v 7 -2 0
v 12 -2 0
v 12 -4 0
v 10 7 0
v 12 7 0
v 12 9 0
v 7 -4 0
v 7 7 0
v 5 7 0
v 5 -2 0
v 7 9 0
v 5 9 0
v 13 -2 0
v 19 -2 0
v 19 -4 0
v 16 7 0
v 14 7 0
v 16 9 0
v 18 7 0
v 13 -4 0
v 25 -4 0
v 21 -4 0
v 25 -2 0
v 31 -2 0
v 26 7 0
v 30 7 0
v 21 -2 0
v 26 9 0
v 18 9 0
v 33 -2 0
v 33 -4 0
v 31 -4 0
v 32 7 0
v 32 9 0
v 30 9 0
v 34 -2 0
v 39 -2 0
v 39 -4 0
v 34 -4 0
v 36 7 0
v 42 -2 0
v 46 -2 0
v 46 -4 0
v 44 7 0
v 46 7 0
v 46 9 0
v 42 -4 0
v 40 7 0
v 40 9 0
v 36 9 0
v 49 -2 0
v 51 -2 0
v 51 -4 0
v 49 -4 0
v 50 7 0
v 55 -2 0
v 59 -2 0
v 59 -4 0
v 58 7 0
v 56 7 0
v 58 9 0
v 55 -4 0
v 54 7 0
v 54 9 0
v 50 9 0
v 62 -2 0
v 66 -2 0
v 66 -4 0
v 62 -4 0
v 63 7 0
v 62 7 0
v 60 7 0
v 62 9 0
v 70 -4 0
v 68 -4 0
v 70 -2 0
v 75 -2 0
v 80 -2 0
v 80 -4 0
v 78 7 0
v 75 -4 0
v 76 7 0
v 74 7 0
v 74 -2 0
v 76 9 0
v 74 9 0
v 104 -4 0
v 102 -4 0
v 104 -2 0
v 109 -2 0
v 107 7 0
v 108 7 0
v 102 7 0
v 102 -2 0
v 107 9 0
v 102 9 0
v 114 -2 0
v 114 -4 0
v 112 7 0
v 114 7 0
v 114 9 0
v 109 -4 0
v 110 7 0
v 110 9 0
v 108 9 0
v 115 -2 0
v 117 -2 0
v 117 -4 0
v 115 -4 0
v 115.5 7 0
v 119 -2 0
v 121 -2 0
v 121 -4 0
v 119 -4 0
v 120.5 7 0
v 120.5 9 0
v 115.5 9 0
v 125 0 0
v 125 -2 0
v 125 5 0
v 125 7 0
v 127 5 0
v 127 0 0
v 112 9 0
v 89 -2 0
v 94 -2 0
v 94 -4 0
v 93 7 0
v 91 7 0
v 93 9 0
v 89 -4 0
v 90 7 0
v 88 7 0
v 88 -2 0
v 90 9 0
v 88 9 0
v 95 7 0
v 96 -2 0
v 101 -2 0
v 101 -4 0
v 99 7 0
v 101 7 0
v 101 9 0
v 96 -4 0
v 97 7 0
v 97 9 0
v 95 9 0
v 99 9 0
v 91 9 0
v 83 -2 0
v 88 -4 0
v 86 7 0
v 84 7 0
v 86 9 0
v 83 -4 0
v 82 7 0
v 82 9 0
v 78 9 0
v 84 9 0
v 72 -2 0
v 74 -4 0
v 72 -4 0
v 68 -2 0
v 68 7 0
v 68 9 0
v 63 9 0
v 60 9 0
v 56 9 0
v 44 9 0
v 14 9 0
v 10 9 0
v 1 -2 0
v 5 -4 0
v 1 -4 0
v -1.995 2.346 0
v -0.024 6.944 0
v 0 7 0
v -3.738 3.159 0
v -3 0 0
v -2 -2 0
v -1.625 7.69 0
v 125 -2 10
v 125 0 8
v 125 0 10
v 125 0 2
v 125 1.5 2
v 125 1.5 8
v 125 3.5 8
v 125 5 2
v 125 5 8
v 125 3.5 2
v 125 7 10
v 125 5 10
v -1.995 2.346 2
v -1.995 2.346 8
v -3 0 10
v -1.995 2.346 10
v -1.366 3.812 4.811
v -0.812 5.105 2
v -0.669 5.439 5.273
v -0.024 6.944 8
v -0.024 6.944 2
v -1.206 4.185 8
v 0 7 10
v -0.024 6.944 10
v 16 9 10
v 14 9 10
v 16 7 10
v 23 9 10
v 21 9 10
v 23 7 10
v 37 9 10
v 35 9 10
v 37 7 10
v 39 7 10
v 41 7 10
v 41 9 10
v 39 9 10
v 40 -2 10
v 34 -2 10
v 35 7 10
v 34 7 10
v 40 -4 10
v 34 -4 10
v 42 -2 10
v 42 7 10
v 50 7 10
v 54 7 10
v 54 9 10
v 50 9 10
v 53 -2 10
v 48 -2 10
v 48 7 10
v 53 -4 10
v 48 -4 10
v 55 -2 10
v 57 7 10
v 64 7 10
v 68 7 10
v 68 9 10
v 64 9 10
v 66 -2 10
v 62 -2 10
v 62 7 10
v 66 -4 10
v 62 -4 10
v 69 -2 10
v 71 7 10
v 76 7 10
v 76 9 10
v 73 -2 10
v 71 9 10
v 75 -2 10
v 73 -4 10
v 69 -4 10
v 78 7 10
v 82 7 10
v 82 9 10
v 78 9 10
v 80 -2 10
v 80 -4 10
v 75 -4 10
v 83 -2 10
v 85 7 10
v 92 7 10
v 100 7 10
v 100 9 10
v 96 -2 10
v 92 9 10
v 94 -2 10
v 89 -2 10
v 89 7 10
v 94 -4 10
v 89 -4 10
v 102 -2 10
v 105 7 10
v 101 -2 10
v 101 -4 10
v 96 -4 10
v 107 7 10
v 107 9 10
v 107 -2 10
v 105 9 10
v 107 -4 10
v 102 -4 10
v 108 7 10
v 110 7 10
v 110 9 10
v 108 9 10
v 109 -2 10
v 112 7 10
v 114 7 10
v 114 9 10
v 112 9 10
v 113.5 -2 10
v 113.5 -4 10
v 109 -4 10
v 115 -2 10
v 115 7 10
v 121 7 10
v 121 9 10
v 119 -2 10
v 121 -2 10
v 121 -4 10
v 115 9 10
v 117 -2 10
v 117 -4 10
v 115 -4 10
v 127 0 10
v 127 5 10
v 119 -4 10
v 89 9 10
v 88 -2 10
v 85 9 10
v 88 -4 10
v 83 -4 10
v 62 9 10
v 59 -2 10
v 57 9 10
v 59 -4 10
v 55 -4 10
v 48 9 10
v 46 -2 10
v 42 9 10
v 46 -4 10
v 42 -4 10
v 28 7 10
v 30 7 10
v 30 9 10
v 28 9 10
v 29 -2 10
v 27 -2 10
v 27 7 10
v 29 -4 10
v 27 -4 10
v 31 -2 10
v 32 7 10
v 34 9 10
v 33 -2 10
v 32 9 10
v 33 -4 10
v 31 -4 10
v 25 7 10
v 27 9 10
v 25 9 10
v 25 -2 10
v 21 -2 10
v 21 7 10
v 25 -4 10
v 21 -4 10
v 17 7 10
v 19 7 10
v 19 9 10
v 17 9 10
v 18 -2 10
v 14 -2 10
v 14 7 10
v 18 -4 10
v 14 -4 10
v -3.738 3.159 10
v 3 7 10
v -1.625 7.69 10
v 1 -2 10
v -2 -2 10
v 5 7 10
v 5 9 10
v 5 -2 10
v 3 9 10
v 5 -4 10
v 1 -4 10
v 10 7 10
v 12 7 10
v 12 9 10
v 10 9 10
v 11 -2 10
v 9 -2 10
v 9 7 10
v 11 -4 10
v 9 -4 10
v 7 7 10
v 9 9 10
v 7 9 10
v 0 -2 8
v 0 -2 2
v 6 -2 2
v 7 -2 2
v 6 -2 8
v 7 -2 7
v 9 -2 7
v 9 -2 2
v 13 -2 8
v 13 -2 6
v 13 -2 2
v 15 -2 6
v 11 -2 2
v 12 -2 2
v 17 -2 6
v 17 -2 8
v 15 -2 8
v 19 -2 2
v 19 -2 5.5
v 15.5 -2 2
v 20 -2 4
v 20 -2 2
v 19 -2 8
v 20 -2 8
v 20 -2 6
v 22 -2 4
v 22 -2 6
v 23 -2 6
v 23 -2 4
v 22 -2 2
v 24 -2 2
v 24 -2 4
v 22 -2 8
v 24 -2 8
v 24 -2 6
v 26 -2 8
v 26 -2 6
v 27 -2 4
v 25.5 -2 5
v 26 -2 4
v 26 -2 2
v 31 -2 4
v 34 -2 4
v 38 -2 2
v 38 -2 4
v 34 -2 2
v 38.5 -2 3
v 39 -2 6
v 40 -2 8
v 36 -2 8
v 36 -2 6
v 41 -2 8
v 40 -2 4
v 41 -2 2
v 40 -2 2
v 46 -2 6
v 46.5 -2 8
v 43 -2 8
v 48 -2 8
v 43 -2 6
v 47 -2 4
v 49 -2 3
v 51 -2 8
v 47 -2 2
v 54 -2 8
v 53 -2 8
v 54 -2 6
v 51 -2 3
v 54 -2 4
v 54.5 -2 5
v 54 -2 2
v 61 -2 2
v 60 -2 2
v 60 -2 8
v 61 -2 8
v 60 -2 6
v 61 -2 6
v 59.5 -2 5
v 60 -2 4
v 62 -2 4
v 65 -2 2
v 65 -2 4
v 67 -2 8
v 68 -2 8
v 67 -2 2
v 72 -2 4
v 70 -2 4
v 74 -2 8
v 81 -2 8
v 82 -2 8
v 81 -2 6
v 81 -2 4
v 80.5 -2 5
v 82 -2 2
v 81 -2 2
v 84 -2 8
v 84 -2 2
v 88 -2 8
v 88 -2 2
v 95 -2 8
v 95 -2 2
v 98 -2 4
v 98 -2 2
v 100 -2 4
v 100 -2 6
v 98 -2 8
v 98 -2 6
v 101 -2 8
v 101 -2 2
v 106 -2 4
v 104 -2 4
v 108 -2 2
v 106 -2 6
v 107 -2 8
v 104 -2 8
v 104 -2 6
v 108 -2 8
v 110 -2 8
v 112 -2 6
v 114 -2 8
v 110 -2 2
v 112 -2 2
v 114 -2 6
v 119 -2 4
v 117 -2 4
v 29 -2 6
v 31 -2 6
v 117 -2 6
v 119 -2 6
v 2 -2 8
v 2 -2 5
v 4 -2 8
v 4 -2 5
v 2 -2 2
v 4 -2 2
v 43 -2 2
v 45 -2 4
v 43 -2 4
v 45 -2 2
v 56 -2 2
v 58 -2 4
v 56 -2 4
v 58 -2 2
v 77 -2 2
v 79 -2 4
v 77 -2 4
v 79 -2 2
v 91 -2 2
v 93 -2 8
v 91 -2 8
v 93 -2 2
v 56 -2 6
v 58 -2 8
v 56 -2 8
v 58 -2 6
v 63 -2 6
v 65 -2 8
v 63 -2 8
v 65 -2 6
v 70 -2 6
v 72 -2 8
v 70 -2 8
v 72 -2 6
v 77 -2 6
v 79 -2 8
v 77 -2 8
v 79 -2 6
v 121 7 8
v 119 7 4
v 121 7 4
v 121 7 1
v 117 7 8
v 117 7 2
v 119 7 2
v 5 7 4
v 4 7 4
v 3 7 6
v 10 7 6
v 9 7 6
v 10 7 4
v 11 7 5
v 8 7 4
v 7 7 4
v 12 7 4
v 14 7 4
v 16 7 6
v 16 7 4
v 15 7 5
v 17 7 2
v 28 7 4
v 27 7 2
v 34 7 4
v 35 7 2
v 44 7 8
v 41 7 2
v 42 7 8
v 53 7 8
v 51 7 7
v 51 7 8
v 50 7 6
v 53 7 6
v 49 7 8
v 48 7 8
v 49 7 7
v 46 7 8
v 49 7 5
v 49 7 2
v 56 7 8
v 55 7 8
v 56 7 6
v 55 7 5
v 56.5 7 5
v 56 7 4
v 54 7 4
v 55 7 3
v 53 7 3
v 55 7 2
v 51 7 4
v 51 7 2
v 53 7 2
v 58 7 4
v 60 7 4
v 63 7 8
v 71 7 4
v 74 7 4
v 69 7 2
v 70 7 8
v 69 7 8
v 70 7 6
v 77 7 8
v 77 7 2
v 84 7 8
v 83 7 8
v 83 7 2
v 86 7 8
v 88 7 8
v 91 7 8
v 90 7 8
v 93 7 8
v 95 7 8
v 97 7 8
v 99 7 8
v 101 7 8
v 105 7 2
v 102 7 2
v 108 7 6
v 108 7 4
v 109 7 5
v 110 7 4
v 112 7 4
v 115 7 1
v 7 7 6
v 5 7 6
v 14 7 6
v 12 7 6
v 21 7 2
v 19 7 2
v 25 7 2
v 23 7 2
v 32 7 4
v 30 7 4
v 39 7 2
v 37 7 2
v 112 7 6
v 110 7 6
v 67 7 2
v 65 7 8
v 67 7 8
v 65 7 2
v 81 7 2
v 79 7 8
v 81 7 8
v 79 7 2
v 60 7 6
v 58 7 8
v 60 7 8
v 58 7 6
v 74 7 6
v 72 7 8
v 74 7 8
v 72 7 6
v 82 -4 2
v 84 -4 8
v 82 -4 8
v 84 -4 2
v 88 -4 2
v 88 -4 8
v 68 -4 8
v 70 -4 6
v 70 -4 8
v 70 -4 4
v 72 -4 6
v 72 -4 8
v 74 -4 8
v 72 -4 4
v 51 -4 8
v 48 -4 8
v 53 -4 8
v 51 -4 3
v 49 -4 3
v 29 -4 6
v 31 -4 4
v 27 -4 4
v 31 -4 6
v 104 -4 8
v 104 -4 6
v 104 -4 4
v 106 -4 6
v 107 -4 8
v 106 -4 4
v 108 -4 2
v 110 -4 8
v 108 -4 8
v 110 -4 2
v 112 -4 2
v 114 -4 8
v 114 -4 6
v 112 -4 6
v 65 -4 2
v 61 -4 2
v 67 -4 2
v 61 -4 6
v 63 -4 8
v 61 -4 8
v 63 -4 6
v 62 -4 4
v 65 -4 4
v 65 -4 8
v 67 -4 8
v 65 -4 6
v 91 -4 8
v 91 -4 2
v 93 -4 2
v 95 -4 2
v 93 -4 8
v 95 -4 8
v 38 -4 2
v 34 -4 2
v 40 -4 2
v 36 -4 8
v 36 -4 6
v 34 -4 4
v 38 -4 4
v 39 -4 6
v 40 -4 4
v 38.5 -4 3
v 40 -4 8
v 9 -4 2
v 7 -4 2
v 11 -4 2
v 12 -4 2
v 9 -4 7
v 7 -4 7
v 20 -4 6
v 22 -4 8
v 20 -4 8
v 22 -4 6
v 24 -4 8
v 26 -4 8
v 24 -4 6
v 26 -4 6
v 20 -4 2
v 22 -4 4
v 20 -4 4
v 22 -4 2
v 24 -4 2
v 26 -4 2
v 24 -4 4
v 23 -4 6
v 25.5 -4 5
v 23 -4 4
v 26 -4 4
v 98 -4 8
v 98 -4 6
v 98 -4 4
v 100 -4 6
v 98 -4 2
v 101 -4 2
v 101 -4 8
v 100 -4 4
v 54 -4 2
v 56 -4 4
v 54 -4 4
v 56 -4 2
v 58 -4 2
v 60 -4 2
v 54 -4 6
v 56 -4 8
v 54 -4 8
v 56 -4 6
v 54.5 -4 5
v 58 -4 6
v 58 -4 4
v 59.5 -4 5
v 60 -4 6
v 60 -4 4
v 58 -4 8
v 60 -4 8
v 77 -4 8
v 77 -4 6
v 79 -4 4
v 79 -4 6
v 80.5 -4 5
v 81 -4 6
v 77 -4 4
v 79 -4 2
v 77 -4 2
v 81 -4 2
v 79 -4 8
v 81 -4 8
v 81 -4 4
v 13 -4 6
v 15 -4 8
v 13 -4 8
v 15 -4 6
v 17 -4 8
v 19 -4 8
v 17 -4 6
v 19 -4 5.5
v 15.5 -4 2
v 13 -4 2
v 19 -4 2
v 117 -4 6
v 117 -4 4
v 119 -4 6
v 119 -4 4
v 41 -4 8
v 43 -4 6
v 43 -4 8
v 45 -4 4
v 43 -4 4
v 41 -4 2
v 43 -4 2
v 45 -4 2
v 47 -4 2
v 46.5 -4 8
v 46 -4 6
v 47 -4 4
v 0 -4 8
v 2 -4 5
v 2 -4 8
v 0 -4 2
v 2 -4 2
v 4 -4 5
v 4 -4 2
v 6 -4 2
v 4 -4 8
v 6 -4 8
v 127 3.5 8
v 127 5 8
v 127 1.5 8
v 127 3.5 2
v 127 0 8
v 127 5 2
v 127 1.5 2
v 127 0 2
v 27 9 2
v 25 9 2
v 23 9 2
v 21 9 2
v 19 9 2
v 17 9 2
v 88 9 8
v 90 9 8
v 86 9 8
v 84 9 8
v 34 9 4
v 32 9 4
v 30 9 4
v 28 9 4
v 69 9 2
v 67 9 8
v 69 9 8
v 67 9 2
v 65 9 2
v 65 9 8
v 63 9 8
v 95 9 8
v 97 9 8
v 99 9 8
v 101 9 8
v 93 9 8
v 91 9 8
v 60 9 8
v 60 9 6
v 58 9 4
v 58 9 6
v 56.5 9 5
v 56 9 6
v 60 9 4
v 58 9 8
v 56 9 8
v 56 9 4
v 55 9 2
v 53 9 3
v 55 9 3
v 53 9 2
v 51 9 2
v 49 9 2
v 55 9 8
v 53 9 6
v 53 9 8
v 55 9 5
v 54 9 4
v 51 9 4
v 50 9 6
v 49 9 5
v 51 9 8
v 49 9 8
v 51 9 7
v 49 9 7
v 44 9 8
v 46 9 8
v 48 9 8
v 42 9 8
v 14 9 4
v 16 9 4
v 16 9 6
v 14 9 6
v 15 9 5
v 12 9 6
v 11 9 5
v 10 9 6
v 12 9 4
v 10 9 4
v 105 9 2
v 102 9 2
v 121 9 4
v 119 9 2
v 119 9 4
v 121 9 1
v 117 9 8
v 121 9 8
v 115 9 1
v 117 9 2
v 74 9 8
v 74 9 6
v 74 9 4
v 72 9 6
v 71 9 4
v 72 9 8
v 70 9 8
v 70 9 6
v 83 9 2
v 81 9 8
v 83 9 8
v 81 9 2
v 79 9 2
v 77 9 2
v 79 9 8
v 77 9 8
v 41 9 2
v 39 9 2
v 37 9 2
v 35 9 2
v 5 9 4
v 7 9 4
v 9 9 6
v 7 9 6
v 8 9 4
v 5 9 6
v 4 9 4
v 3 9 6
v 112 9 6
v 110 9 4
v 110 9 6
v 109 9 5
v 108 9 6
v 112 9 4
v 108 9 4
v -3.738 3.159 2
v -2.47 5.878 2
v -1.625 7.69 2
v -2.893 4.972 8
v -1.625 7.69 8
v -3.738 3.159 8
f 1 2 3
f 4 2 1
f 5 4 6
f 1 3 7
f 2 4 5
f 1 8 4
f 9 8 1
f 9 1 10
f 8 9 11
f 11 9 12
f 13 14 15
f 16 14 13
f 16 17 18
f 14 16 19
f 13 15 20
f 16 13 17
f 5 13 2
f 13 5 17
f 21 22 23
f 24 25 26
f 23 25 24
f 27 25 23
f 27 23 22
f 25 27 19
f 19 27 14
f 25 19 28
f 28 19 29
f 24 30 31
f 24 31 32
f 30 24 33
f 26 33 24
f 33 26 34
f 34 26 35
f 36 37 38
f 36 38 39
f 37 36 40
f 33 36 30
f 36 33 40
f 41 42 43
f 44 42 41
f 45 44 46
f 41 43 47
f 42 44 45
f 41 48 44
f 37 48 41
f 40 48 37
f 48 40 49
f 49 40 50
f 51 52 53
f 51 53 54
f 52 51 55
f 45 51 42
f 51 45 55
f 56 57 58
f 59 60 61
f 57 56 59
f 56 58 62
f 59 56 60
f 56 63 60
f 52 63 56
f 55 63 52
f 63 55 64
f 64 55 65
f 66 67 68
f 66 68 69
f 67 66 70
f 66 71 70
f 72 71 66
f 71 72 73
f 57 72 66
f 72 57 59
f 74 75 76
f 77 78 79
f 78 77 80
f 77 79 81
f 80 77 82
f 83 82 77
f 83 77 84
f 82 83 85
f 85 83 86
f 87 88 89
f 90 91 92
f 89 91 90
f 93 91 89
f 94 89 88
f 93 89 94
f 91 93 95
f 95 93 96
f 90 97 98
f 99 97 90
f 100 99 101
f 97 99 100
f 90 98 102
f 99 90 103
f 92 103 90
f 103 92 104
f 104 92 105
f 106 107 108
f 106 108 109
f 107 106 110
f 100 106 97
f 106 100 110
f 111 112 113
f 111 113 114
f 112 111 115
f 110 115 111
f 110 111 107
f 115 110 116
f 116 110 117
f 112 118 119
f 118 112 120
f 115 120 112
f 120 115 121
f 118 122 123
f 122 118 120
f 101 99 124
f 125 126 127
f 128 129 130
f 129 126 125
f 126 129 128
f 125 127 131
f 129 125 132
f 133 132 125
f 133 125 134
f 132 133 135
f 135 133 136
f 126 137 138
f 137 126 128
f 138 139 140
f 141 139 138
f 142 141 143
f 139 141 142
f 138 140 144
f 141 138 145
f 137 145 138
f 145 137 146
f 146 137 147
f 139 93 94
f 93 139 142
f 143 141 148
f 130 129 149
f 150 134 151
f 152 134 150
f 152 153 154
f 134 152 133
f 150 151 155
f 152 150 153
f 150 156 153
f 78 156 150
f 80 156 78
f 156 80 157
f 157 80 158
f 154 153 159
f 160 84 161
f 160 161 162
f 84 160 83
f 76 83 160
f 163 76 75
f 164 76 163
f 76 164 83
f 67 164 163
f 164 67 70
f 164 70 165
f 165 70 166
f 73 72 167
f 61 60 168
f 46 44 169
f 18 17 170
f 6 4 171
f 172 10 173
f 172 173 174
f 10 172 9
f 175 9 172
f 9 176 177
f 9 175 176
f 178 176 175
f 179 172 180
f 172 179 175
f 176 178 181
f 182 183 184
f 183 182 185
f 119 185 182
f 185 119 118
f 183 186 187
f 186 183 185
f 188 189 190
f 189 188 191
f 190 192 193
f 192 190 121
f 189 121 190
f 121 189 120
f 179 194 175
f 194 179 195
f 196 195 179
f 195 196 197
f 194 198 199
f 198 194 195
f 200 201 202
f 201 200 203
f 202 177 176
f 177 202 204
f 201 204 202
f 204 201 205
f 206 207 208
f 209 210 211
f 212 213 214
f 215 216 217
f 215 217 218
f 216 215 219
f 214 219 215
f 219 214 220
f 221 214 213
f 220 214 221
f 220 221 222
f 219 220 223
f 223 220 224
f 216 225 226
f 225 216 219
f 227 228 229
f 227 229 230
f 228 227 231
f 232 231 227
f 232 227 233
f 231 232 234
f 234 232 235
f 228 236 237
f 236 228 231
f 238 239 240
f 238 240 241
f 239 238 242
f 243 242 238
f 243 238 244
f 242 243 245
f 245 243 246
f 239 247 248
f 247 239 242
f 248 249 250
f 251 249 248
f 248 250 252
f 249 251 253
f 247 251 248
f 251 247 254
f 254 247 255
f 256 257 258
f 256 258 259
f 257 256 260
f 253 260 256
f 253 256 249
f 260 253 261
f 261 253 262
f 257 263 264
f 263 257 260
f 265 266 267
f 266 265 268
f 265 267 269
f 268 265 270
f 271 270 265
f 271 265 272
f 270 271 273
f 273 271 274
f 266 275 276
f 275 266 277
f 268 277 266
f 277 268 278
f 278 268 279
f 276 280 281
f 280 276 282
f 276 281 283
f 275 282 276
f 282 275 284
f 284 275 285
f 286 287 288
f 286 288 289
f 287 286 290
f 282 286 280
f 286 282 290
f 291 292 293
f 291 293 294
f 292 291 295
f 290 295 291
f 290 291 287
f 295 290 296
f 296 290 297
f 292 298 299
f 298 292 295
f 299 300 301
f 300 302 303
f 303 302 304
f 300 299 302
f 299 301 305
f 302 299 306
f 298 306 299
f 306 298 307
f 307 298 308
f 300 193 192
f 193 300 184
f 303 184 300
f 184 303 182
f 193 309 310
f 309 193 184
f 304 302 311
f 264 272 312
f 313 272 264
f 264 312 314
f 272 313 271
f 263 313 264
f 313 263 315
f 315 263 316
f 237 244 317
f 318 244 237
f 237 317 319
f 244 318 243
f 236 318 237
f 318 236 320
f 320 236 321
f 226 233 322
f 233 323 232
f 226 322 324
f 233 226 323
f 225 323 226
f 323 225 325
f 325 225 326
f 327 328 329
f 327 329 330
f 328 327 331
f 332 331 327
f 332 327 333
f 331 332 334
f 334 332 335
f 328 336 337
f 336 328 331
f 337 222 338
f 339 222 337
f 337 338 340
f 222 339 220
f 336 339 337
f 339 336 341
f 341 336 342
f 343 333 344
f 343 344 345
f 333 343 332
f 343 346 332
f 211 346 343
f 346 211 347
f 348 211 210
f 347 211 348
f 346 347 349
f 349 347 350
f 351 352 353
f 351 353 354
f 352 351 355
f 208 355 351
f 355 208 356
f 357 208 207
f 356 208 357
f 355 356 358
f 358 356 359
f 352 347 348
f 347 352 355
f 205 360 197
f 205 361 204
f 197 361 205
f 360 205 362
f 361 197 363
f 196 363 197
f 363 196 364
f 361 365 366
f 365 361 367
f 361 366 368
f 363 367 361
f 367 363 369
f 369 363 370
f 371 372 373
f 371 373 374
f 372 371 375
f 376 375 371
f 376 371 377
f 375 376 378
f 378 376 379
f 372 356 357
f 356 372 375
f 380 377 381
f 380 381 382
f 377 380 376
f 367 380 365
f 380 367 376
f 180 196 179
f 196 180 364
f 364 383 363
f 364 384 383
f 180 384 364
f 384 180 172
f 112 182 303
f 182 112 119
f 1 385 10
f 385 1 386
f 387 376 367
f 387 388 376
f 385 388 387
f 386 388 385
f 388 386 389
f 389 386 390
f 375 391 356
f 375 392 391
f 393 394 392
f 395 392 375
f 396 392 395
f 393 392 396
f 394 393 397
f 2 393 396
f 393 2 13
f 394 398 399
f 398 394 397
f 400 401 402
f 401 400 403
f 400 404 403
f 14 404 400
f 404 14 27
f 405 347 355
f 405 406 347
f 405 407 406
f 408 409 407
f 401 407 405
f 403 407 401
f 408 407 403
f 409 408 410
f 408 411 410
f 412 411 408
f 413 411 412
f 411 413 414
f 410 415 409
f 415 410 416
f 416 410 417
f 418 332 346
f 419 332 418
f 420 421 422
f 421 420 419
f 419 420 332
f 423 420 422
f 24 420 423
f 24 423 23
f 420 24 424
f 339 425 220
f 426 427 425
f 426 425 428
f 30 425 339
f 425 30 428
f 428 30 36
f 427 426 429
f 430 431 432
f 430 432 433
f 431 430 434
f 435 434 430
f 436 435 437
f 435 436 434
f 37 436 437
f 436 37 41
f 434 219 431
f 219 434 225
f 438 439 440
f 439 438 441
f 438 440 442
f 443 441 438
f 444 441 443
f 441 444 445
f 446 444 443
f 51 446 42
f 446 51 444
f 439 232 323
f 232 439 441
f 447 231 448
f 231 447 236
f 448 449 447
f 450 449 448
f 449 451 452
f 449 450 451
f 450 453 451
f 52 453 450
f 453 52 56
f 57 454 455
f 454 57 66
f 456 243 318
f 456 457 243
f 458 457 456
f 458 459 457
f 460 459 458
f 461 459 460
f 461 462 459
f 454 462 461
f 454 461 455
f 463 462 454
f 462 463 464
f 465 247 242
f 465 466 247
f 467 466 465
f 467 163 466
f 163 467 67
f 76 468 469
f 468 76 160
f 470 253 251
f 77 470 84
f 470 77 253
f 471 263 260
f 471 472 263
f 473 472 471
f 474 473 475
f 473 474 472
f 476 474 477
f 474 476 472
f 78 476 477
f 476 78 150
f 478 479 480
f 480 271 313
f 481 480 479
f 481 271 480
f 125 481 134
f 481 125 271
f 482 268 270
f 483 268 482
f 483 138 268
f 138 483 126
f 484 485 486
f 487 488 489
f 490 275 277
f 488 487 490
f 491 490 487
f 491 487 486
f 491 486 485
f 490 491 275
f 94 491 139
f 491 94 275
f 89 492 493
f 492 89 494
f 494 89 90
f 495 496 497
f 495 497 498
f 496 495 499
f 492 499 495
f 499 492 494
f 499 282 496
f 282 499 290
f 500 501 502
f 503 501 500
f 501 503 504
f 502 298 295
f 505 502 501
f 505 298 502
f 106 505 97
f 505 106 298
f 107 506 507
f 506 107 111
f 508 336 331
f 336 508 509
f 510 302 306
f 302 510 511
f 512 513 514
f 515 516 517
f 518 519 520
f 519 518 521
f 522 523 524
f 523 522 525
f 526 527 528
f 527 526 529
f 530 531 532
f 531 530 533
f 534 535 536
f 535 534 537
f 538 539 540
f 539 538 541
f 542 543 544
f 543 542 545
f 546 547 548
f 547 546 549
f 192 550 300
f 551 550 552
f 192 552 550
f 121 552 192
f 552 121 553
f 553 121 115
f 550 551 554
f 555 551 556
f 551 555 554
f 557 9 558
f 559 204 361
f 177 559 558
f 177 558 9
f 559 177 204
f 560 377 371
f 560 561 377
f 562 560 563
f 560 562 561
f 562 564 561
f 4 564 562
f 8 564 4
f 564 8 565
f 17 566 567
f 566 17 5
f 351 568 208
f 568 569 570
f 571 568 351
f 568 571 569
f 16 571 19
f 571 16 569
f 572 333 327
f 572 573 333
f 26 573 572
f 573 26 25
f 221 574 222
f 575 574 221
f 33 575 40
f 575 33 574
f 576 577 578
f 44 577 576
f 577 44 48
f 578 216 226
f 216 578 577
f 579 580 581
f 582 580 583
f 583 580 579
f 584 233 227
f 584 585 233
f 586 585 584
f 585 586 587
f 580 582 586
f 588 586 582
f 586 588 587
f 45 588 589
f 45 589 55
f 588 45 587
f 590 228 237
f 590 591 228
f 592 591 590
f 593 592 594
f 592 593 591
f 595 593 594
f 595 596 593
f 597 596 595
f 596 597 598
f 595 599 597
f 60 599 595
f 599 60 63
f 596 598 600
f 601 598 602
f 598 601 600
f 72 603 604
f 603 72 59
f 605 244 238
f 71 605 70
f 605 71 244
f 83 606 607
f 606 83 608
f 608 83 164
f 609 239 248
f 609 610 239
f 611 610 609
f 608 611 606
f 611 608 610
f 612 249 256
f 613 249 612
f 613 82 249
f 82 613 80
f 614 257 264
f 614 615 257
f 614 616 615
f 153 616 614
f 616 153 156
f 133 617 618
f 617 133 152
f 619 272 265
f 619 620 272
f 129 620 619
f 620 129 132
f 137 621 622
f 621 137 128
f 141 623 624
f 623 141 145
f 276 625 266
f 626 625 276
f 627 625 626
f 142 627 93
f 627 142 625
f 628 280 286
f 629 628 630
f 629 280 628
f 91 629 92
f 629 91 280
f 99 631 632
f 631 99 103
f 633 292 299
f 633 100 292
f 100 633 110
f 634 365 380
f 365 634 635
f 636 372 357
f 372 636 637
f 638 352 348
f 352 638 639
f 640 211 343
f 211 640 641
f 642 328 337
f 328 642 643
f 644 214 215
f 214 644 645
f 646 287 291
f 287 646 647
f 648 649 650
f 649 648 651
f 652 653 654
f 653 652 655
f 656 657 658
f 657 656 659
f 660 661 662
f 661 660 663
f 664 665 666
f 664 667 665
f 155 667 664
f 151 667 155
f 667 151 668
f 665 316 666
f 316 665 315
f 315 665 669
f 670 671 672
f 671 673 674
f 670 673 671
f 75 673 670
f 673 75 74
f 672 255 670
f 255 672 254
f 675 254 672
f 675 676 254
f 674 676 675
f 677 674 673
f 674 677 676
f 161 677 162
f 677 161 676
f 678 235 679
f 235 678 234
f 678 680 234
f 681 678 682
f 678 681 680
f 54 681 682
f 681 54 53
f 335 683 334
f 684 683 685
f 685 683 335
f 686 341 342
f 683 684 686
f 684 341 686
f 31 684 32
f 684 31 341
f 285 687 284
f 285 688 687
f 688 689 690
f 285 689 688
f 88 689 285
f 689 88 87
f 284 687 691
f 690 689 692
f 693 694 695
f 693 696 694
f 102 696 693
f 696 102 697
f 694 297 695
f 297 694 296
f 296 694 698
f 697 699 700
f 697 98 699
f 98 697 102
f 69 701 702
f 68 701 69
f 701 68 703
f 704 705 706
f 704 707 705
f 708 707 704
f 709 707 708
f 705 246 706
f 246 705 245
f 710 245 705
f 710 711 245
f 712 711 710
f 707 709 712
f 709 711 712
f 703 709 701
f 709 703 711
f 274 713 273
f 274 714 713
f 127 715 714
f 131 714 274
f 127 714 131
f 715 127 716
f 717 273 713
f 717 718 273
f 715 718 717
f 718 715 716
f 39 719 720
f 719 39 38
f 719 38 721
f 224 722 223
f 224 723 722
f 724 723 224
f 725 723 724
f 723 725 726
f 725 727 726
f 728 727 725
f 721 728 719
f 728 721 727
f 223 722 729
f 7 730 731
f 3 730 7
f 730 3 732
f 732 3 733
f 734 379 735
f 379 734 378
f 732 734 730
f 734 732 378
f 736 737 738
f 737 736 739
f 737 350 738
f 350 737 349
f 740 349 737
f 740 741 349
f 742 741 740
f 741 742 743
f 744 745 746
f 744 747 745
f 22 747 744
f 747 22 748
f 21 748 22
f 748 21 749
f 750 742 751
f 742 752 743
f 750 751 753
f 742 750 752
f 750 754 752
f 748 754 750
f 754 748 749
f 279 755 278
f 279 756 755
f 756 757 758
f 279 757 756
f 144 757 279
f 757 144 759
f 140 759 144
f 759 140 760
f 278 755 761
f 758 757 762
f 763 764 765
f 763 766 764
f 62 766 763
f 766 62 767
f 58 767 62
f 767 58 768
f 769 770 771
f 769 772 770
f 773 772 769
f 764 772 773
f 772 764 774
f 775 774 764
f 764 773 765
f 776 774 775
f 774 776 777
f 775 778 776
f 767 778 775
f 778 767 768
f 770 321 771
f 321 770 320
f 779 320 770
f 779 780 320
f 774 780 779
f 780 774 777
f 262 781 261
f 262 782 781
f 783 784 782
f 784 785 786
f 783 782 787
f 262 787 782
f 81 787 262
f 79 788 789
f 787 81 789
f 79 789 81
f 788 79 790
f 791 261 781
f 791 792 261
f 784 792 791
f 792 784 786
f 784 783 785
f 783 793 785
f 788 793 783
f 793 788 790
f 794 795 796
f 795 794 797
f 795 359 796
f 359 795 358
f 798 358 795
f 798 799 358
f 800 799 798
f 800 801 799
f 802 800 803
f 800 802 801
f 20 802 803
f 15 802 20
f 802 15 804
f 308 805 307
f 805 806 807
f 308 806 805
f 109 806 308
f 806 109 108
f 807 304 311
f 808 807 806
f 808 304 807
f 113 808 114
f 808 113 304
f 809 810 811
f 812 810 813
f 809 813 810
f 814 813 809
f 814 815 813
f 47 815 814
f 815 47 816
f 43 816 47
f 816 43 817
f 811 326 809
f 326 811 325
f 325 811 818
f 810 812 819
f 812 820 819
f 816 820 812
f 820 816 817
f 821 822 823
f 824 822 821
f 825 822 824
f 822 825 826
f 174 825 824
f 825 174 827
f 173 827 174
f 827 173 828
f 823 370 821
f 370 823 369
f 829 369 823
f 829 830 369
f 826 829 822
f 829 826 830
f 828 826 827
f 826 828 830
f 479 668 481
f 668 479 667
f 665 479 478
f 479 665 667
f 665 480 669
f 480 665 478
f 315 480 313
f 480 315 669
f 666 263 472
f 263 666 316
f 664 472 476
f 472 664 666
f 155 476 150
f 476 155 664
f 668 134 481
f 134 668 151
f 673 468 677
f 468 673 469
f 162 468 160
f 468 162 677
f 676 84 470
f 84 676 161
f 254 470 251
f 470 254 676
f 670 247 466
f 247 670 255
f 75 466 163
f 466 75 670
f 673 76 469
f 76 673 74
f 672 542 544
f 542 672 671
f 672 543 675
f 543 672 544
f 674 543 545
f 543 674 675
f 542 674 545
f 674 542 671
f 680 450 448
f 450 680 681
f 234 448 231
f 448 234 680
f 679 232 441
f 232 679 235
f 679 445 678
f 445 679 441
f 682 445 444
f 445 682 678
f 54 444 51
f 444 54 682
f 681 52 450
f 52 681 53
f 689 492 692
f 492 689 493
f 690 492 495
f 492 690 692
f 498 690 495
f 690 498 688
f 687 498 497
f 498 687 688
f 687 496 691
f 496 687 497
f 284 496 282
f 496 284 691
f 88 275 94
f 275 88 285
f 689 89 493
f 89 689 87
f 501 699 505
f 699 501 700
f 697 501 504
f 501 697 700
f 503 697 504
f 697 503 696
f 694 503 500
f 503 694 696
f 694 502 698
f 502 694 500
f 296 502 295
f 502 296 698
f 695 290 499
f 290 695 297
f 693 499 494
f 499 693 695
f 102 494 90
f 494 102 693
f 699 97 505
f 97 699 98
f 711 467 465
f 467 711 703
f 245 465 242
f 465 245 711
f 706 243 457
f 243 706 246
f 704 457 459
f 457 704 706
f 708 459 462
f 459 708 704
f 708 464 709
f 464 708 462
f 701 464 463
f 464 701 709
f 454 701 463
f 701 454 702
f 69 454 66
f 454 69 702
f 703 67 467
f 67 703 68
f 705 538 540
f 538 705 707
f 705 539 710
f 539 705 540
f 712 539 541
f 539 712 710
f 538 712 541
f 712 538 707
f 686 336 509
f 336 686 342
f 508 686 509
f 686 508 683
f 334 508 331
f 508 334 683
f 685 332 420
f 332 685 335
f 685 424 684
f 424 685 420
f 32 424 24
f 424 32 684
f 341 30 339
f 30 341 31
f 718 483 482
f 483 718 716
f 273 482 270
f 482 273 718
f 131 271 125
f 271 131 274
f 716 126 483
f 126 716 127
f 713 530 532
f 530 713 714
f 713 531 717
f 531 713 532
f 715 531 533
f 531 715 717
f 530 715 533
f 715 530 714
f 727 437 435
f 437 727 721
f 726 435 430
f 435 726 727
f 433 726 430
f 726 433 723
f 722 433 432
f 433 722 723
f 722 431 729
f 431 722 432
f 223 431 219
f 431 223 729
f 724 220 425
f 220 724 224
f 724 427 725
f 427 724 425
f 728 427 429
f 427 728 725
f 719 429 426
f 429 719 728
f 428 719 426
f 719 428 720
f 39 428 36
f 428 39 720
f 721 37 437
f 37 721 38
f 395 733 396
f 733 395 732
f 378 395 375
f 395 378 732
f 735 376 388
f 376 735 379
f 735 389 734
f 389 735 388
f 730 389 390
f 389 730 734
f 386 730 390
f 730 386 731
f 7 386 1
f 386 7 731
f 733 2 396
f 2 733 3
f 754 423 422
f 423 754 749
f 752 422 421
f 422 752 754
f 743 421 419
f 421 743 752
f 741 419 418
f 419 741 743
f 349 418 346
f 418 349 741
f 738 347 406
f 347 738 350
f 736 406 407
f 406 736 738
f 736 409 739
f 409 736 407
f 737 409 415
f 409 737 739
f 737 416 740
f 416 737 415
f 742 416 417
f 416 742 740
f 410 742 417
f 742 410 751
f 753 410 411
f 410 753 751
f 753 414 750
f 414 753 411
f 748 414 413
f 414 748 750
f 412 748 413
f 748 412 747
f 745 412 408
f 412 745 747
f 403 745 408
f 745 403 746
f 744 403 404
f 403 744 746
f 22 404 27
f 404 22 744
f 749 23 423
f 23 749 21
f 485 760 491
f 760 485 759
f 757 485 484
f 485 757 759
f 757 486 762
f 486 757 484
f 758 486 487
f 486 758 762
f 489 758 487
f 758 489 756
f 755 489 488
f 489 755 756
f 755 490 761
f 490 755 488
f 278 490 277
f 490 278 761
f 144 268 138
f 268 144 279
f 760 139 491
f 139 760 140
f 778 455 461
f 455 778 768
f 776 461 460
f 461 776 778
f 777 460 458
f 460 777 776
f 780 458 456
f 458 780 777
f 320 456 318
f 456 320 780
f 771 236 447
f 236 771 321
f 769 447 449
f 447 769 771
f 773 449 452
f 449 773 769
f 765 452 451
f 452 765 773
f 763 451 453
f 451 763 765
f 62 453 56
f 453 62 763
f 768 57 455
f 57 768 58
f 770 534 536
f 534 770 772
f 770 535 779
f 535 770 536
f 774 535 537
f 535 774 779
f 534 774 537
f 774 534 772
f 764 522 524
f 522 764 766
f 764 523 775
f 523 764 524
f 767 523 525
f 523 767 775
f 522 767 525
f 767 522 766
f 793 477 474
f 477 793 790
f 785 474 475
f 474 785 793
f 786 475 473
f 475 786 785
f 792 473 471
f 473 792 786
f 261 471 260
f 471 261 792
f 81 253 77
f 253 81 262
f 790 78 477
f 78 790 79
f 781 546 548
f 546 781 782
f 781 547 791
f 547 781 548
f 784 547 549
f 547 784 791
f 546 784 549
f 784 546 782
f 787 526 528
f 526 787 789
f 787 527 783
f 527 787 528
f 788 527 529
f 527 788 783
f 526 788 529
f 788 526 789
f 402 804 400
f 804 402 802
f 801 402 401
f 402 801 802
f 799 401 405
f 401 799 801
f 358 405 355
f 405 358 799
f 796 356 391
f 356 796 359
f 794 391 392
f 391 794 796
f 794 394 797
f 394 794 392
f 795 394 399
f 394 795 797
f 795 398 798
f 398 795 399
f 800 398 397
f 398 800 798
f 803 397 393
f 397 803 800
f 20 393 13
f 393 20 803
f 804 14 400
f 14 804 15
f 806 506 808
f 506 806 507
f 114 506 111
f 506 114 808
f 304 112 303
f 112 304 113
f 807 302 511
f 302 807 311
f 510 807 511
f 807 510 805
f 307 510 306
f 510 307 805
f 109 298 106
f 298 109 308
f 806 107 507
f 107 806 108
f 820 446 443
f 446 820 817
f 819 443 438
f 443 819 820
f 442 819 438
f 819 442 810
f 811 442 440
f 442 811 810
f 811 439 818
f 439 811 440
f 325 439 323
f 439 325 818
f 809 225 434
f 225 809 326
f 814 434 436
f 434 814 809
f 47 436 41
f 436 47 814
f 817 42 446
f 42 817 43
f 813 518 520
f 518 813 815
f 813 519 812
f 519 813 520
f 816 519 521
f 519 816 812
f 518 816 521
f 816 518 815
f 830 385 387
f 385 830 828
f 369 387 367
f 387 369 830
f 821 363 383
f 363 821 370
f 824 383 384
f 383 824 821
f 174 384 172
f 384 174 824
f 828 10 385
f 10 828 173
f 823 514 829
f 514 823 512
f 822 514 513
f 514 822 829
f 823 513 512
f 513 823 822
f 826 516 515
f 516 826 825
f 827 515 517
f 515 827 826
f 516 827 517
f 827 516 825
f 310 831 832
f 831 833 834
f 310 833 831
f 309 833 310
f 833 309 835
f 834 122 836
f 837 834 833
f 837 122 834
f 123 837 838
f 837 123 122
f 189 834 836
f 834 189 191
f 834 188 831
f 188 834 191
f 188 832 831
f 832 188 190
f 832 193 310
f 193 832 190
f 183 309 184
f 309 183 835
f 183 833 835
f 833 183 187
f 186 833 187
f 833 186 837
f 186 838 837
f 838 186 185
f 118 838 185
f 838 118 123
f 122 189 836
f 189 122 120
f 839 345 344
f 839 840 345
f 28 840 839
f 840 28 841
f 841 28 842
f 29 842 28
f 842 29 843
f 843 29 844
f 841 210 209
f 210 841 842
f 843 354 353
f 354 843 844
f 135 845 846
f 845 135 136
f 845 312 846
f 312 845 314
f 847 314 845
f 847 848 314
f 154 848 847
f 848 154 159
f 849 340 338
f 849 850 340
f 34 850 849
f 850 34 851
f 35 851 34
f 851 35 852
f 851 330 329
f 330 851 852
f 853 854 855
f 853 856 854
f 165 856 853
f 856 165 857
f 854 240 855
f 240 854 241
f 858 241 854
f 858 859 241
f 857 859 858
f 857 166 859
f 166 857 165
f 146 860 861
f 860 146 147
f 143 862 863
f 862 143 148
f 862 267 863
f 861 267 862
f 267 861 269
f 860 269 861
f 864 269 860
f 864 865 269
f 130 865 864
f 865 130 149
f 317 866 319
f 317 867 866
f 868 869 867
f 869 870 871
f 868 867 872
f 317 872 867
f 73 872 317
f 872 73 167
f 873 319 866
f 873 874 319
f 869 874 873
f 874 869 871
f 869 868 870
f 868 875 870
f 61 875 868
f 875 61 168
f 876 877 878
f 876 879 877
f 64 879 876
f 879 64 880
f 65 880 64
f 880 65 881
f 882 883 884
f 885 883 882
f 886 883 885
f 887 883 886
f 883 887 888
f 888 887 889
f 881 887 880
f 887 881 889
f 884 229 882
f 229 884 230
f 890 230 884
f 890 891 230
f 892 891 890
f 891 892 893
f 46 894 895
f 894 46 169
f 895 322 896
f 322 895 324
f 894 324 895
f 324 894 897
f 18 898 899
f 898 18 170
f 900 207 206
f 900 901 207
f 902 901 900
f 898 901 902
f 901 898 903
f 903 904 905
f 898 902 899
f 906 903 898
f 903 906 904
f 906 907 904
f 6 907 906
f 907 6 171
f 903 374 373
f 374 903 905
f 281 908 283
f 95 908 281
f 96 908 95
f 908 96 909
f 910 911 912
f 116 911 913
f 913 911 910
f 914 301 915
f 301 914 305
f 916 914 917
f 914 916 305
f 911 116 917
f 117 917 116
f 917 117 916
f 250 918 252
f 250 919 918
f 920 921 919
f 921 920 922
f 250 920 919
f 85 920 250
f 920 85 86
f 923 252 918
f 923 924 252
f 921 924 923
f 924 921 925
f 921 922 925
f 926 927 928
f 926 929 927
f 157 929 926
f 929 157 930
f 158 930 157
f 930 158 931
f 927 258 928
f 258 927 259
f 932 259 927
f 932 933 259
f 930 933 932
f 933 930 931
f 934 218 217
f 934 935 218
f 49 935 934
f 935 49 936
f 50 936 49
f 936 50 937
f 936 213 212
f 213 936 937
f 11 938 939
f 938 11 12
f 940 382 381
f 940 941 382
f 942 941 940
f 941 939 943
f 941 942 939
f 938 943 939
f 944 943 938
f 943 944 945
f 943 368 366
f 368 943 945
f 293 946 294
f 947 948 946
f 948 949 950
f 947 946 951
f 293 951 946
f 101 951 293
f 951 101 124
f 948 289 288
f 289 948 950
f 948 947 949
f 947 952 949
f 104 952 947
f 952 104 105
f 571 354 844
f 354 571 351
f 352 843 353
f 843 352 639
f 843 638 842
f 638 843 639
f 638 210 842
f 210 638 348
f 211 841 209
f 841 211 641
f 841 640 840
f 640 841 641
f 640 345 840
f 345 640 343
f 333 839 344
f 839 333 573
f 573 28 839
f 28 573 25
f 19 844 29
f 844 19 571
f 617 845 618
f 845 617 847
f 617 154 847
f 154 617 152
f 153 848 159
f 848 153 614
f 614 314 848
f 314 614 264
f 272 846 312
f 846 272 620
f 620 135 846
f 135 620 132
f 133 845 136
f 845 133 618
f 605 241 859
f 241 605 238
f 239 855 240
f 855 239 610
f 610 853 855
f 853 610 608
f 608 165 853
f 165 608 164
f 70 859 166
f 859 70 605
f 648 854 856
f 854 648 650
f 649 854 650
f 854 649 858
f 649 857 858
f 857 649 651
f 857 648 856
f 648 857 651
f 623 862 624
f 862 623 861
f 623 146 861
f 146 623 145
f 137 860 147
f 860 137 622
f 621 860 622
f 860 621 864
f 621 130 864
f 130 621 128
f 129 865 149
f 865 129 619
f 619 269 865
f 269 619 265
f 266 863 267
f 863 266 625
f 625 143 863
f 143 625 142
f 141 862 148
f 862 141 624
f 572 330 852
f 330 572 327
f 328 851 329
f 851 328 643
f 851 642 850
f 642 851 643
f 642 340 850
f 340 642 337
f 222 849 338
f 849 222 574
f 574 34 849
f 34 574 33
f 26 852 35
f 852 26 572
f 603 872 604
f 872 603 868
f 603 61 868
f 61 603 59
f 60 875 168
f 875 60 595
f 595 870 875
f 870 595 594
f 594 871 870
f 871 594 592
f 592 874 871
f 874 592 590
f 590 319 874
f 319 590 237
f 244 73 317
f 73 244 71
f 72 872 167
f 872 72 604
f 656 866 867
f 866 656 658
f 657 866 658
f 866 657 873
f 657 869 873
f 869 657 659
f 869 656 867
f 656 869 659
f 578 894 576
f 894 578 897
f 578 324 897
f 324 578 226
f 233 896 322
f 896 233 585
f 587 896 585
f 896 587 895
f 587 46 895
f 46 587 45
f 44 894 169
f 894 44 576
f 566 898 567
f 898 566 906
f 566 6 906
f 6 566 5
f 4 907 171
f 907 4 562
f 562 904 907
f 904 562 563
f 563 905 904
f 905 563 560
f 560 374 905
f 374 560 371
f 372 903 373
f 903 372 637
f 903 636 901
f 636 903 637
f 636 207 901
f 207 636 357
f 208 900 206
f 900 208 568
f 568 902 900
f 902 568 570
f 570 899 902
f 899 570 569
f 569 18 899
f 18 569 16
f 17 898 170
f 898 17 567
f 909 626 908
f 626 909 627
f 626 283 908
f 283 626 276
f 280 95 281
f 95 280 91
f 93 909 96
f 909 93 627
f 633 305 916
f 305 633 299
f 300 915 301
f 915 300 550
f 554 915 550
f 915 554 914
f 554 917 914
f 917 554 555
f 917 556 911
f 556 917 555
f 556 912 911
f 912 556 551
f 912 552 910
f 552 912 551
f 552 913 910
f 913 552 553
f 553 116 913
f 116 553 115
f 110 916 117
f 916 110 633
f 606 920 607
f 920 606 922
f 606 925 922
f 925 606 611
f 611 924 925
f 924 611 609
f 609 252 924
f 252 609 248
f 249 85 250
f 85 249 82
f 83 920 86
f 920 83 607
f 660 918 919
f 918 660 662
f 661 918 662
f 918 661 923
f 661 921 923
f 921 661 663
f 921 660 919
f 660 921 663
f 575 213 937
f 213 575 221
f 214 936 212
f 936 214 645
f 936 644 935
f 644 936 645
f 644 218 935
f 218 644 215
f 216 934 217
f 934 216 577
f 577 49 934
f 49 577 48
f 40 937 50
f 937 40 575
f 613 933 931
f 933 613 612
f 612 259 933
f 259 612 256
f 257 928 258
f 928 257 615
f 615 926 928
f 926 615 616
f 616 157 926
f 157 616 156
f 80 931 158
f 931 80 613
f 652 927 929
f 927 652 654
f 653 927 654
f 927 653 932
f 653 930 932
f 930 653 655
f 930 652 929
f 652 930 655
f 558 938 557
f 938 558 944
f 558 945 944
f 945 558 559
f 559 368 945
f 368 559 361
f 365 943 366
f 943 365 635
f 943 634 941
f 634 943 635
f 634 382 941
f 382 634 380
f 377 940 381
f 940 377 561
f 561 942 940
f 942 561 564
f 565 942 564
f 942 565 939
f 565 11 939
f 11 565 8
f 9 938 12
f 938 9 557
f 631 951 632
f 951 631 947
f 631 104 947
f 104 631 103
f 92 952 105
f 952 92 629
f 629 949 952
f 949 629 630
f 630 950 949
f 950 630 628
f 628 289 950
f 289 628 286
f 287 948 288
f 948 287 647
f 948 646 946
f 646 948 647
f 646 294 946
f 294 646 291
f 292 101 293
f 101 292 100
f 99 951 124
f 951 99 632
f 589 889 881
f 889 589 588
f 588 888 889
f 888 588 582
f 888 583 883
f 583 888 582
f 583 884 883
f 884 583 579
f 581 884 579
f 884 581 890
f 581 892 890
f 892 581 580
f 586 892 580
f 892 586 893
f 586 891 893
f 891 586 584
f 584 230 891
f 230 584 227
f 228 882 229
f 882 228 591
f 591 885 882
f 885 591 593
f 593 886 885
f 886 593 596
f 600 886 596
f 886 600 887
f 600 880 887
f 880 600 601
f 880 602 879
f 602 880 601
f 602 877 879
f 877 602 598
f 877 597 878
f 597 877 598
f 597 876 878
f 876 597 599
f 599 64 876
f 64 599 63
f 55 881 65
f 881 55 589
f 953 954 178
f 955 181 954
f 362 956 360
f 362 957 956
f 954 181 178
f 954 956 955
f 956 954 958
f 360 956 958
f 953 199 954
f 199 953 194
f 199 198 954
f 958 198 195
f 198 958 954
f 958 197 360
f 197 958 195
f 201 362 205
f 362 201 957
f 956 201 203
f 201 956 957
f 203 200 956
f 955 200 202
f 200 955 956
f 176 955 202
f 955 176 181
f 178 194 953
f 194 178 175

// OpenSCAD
// file: Spiff.scad
include <spiffsans.scad>

module write(string,font=spiffsans,spacing=1,i=0) {
  if (i < len(string)) {
    assign(charindex = search(string[i],font,1)[0])
    
    // If the character is in the font
    if (charindex != undef) {
      assign(glyph = font[charindex][2])
      if (glyph){
        polygon(points=glyph[0], paths=glyph[1]);
      }
      translate([font[charindex][1] + spacing, 0, 0])
        write(string, font, spacing, i=i+1);
    } else {
      assign(glyph = font[0][2])
      if (glyph){
        polygon(points=glyph[0], paths=glyph[1]);
      }
      translate([font[0][1] + spacing,0,0])
        write(string, font, spacing, i=i+1);
    }
  }
}
// main file
use <Spiff.scad>;

//for the daring: comment this line out!
linear_extrude(height=10) polygon([[-2,-2],[125,-2],[125,7],[0,7],[-3,0]]);

rotate([90,0,0]) linear_extrude(height=4) write("0123456789ABCDEFGH");
translate([123,0,0]) rotate([90,0,90]) linear_extrude(height=4) write("I");
translate([121,5,0]) rotate([90,0,180]) linear_extrude(height=4) write("JKLMNOPQRSTUVWXY");
translate([2,6,0]) rotate([90,0,245]) linear_extrude(height=4) write("Z");
